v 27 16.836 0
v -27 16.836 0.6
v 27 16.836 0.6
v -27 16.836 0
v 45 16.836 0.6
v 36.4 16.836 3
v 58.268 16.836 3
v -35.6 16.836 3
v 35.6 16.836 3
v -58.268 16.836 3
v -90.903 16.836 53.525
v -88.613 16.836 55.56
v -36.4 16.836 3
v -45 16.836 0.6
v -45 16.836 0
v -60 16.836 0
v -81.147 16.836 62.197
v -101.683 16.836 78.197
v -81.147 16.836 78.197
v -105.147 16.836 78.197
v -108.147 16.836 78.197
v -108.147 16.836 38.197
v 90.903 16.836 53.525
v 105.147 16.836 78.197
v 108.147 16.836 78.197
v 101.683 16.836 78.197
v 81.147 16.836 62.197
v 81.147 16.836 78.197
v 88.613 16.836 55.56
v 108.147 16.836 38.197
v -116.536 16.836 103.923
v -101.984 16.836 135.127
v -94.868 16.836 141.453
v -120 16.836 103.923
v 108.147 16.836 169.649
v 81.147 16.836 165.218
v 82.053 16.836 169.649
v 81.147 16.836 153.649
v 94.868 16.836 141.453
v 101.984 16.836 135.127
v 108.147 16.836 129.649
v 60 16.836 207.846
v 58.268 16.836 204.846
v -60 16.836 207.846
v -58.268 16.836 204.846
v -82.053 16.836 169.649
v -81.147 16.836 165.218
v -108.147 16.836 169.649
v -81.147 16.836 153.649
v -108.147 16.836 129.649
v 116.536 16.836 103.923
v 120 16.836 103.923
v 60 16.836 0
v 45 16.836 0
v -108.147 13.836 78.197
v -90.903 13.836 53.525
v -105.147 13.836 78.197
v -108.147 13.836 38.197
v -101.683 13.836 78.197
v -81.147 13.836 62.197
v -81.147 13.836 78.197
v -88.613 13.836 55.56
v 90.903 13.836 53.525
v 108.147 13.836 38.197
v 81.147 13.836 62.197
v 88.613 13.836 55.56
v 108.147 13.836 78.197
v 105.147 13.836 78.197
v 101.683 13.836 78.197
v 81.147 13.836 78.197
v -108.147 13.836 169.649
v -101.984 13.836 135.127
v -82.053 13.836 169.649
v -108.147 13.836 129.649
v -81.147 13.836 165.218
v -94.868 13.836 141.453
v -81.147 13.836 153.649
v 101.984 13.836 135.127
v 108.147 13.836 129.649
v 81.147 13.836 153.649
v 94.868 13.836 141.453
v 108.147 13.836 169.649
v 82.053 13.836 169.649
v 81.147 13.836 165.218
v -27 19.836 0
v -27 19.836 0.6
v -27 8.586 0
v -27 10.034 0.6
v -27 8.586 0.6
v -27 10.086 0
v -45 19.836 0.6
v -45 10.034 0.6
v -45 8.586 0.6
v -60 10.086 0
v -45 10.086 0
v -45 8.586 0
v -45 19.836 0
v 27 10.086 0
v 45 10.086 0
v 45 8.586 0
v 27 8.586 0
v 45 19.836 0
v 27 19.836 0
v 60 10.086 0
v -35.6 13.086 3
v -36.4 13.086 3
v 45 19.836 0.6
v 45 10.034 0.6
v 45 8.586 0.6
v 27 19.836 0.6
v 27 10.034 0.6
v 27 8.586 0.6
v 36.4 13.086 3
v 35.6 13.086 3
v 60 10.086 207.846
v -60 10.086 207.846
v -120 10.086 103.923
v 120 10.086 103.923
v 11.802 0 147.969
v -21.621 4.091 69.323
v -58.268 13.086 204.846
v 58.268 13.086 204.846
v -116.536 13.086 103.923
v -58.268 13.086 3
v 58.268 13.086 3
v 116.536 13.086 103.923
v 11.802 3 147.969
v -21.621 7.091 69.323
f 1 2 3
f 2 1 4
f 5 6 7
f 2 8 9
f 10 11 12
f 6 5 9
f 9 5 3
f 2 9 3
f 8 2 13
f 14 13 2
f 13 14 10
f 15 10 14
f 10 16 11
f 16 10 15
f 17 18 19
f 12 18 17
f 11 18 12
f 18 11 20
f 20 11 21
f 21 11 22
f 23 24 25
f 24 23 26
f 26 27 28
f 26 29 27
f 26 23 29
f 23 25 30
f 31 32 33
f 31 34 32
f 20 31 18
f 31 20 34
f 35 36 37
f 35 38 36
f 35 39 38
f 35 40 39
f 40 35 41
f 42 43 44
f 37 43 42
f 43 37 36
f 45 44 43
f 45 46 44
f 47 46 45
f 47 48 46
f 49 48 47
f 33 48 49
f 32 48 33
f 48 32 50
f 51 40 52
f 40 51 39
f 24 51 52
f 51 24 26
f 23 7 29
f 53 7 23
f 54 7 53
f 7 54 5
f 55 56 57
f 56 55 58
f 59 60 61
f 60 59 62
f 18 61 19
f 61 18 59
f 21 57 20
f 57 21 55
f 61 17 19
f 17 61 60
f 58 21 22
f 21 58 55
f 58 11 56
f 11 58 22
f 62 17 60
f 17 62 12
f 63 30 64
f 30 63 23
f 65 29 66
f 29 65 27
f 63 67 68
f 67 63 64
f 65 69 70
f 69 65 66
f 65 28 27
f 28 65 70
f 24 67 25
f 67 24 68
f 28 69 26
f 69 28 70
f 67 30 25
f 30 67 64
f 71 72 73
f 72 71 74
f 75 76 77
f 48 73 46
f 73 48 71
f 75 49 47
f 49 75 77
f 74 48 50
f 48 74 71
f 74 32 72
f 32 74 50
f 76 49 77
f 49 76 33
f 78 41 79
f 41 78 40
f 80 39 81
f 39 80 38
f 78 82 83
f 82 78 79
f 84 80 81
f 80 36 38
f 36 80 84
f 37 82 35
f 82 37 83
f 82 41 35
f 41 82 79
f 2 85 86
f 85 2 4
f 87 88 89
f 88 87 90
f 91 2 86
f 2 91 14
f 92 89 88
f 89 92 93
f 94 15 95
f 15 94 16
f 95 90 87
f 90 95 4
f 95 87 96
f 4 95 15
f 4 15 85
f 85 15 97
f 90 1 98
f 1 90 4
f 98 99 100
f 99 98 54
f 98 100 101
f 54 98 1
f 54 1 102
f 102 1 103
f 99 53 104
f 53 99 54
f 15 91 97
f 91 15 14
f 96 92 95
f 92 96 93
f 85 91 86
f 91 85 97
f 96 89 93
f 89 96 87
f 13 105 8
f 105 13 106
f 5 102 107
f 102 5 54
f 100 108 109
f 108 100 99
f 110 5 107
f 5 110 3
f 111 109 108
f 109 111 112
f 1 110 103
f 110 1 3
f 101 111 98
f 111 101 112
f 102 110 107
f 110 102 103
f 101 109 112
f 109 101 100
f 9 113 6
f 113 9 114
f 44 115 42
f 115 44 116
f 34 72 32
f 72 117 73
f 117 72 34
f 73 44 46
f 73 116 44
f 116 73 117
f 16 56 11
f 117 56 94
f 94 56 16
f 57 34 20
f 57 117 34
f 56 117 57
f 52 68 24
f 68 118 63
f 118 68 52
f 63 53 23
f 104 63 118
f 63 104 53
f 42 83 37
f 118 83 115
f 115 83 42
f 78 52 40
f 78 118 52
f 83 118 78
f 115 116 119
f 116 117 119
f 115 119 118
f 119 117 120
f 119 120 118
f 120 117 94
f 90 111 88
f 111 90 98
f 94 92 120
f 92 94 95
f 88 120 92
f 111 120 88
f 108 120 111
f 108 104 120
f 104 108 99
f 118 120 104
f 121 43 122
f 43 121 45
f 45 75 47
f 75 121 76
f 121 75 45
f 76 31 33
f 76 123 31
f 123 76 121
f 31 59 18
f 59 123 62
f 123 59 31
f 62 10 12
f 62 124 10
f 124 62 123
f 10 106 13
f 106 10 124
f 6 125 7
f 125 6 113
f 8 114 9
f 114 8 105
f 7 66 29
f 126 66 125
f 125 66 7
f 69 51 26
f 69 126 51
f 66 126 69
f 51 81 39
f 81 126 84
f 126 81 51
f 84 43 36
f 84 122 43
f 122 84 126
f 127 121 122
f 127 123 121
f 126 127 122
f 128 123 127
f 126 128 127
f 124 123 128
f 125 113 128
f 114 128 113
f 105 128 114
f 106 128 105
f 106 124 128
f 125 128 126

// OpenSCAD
/*
    parametric_faceted_hex_wall_tile_mount_v32_native_vertical_mounts_fixed_anchor.scad
    ----------------------------------------------------------------
    Regular asymmetric low-poly hex wall tile.

    v32 goals
    ---------
    1. Multi-object plate packing is the default design target.
    2. Preserve a TRUE regular hexagon -- no X/Y stretching.
    3. Default maximum corner-to-corner width = 240 mm / 9.449 in.
    4. Vertical export rests on a complete flat hex side, not a point.
    5. Open back remains fully open.
    6. Hidden mounting pads remain clipped below the visible face.
    7. One master thickness controls shell, perimeter, and pads.
    8. Integrated low-profile sacrificial stabilizer feet are enabled by default.
    9. Vertical export uses mounting pads generated directly in final print
       coordinates instead of rotating/clipping the legacy rear tabs.
    10. v32 fixes the side-wall anchor so every pad penetrates the sloped
        perimeter wall over its ENTIRE vertical span.
    11. Each pad begins with a 45-degree lower ramp from that wall connection,
        preventing isolated first layers.
    12. No tall fins, diagonal scaffolds, horizontal shelves, or slicer-generated
        support are intended.
    13. The rear mounting surface remains flat for double-stick tape.

    Recommended default
    -------------------
    face_size_reference      = "across_corners";
    face_size_units          = "mm";
    face_size                = 240.0;   // 9.449" maximum width

    tile_rotation_deg        = 15;

    export_orientation       = "vertical";
    vertical_edge_angle_deg  = 15;      // flat side on build plate

    master_thickness_mm      = 3.0;
    add_mount_pads           = true;
    add_mount_ribs           = false;

    // Multi-copy stability:
    add_vertical_breakaway_feet = true;
    vertical_foot_depth_mm       = 5.0;
    vertical_foot_height_mm      = 0.60;
    vertical_foot_neck_mm        = 0.80;

    Export
    ------
    F6 Render
    File -> Export -> Export as STL
*/


// =============================================================================
// CUSTOMIZER PARAMETERS
// =============================================================================


/* [Finished Face Size] */

// "bounding_square"
//     face_size is the maximum X and Y envelope.
//
// "flat_to_flat"
//     face_size is the traditional hex flat-to-flat dimension.
//
// "across_corners"
//     face_size is the regular-hex corner-to-corner dimension.
//
// v32 DEFAULT:
// across_corners = 240 mm so the vertically printed tile is about:
//     X = 240.0 mm
//     Z = 207.85 mm
// while resting on a complete flat edge.
face_size_reference = "across_corners"; // [bounding_square, flat_to_flat, across_corners]

// Units used by face_size.
face_size_units = "mm";                   // [mm, in]

// Default = 240 mm / 9.449 in maximum corner-to-corner width.
// This leaves useful X-axis margin on a 256 mm plate.
face_size = 240.0;

// Rotation of the finished hex within its face plane.
//
// IMPORTANT:
// 15 degrees gives a regular hex an equal X/Y bounding envelope.
// With bounding_square + 254 mm this produces approximately:
//     X = 254.0 mm
//     Y = 254.0 mm
tile_rotation_deg = 15;


/* [Export / Print Orientation] */

// "flat"     = conventional CAD orientation; decorative face points +Z.
// "vertical" = rotate final part onto an edge for vertical printing.
export_orientation = "vertical";          // [flat, vertical]

// Additional in-plane rotation used ONLY before standing the part vertically.
//
// IMPORTANT:
// The finished face uses tile_rotation_deg = 15 so its X/Y envelope is exactly
// square. A regular hex rests on a FLAT SIDE when its effective print-plane
// rotation is 30 degrees (modulo 60 degrees).
//
// Therefore the default vertical export adds another 15 degrees:
//
//     15 deg finished-face rotation
//   + 15 deg vertical export rotation
//   = 30 deg effective print rotation
//
// This puts a complete flat hex side on the build plate instead of a point.
// The transformed model is automatically translated so that side rests at Z=0.
// Rotate the finished 15-degree face orientation another 15 degrees before
// standing it up. 15 + 15 = 30 degrees, which places a complete hex side
// horizontally at the bottom rather than balancing the tile on a vertex.
vertical_edge_angle_deg = 15;

// Add small breakaway stabilizer feet after the model is stood vertically.
// Normally leave OFF and use a slicer brim if required.
add_vertical_breakaway_feet = true;

// Breakaway-foot dimensions.
vertical_foot_length_mm = 18.0;
vertical_foot_depth_mm = 5.0;
vertical_foot_height_mm = 0.60;
vertical_foot_neck_mm = 0.80;


/* [MASTER THICKNESS] */

// Main material thickness control.
master_thickness_mm = 3.0;

// Optional tuning multipliers.
front_shell_multiplier = 1.0;
perimeter_multiplier   = 1.0;
mount_pad_multiplier   = 1.0;


/* [Front Relief] */

// "proportional" scales relief with the true flat-to-flat dimension.
// "absolute" uses explicit millimeter values.
relief_height_mode = "proportional";      // [proportional, absolute]

relief_scale = 1.0;

// Relative relief proportions.
peak_height_ratio = 0.081;
ridge_to_peak_ratio = 0.757;
edge_to_peak_ratio = 0.097;

// Used only in absolute mode.
peak_height_mm   = 18.5;
ridge_height_mm = 14.0;
edge_height_mm  = 1.8;

// Minimum air gap between inner roof and mounting geometry.
edge_clearance_mm = 0.60;


/* [Facet Layout] */

peak_angle_deg = 45;
peak_radius_ratio = 0.38;

ridge_angle_deg = 208;
ridge_radius_ratio = 0.34;


/* [Wall Mounting] */

add_mount_pads = true;

// Width parallel to local hex edge.
mount_pad_width_mm = 34.0;

// Radial depth into the cavity.
mount_pad_depth_mm = 24.0;

// Structural overlap beneath the inner perimeter shell.
mount_pad_overlap_mm = 4.0;

// Pull mounting geometry inward from the visible outside perimeter.
 // Keep this smaller than the perimeter-wall thickness so the pad still
 // overlaps the wall by a positive amount.
// IMPORTANT:
 // Must be LESS than perimeter_wall_thickness_mm so the pads physically
 // overlap the perimeter wall and become one connected solid.
 mount_pad_edge_inset_mm = 0.5;

// Clearance below underside of visible face.
mount_face_clearance_mm = 0.75;

// Mount-pad directions in the tile's local coordinate system.
mount_pad_angles = [60, 120, 240, 300];


/* [Mount Reinforcement] */

add_mount_ribs = false;

mount_rib_width_mm  = 3.0;
mount_rib_height_mm = 5.0;
mount_rib_depth_mm  = 8.0;


/* [Optional Screw Holes] */

add_pad_screw_holes = false;

pad_screw_hole_diameter_mm = 4.5;



/* [Plate Packing Guidance] */

// These values do NOT duplicate objects inside the STL.
// They provide planning numbers in the OpenSCAD console for arranging
// multiple copies in the slicer.
//
// Typical X2D-style plate planning:
//   usable Y = 256 mm
//   keep a conservative front/rear margin
plate_depth_mm = 256.0;

plate_front_margin_mm = 8.0;
plate_rear_margin_mm  = 8.0;

// Recommended empty gap between adjacent standing tiles.
// Increase if using aggressive acceleration or if the printer has noticeable
// resonance/wobble on tall parts.
recommended_inter_tile_gap_mm = 8.0;

// Feet extend from Y=0 to vertical_foot_depth_mm.
// The actual tile relief occupies approximately peak_height in Y.
// Packing pitch uses whichever is deeper, plus the inter-tile gap.


/* [Native Vertical Mount Pads] */

// v31 default.
//
// In vertical export mode, do NOT use the legacy radial mounting-pad solids.
// Instead create four tape pads directly on the rear face in final print
// coordinates. This makes their layer behavior explicit and predictable.
use_native_vertical_mount_pads = true;

// Number/locations are defined as fractions of total vertical print height.
// Two pads on the left and two on the right.
vertical_mount_z_ratios = [0.28, 0.72];

// Height of each rear tape pad in final print Z.
vertical_mount_height_mm = 40.0;

// How far each pad extends inward from the perimeter wall in final print X.
vertical_mount_depth_mm = 24.0;

// Positive overlap into the perimeter wall so the tab is one fused solid.
vertical_mount_wall_overlap_mm = 3.0;

// 45-degree lower ramp length.
// Keep equal to depth for a true 45-degree supportless lower boundary.
vertical_mount_ramp_mm = 24.0;

// Rear-pad thickness in Y. By default use the master mount-pad thickness.
vertical_mount_thickness_mm = master_thickness_mm * mount_pad_multiplier;

// Small inset from top/bottom extremes for safety.
vertical_mount_min_edge_clearance_mm = 8.0;


/* [Vertical Self-Supporting Mount Pads] */

// Recommended ON for vertical printing.
//
// Each rectangular mounting-pad footprint is clipped by a 45-degree
// print-space half-space. The lower boundary starts at the pad's wall-connected
// outer corner and rises toward the unsupported portion of the pad.
//
// This avoids BOTH:
//   1. floating-island starts
//   2. flat horizontal pad undersides that cause slicer support warnings.
make_mount_pads_vertical_self_supporting = true;

// Small amount below the wall-connected start height that is retained.
// 0.20 mm is approximately one standard layer and guarantees overlap.
mount_pad_print_safety_mm = 0.20;

// Lower-face chamfer angle in FINAL PRINT coordinates.
//
// 45 degrees is the conservative default for supportless PLA printing.
// Larger values make a steeper/more vertical underside.
// Keep between 40 and 55 degrees unless deliberately experimenting.
mount_pad_support_angle_deg = 45.0;

// Large half-space size used only for clipping.
print_halfspace_size_mm = 1000.0;


/* [Vertical Anti-Float Gussets] */

// Some mounting pads begin above the build plate when the tile is printed
// vertically. Instead of a tall free-standing fin, v28 generates a short,
// diagonal sacrificial gusset from the already-printed perimeter wall toward
// the lowest corner of each affected pad.
//
// The gusset:
// - stays inside the rear cavity
// - is thin in Y for easy removal
// - grows from the shell toward the pad
// - is generated only for pads that would otherwise start as an island
add_vertical_antifloat_gussets = false;

// Thin sacrificial thickness into the cavity.
antifloat_gusset_thickness_mm = 0.70;

// How far the gusset extends into the pad for reliable layer connection.
antifloat_gusset_pad_overlap_mm = 1.50;

// Vertical distance below the first pad layer used for the shell-side anchor.
// A 30 mm drop keeps the diagonal print angle conservative while remaining
// dramatically shorter than the previous full-height support fins.
antifloat_gusset_drop_mm = 30.0;

// Height of the short attachment edge against the perimeter wall.
antifloat_gusset_wall_base_mm = 5.0;

// Keep the wall anchor slightly inside the visible outer perimeter.
antifloat_gusset_wall_inset_mm = 1.5;

// Ignore a pad if its lowest point is already essentially on the build plate.
antifloat_min_height_mm = 0.80;


/* [Advanced] */

polyhedron_convexity = 12;
screw_hole_fn = 40;

// Small numerical tolerance.
eps = 0.01;


// =============================================================================
// HELPERS
// =============================================================================

function polar(angle_deg, radius) =
    [
        radius * cos(angle_deg),
        radius * sin(angle_deg)
    ];

function hex_vertex_unrotated(i, radius) =
    [
        radius * cos(30 + i * 60),
        radius * sin(30 + i * 60)
    ];

function rotate2d(p, angle_deg) =
    [
        p[0] * cos(angle_deg) - p[1] * sin(angle_deg),
        p[0] * sin(angle_deg) + p[1] * cos(angle_deg)
    ];


// Position of a raw mount-pad corner after all in-plane rotations used by the
// vertical export. Returned as [final_X, final_Z] because after rotate X=90,
// original in-plane Y becomes print Z.
function mount_print_corner(angle_deg, radial_r, lateral_t) =
    let(
        theta =
            angle_deg
            + tile_rotation_deg
            + vertical_edge_angle_deg
    )
    [
        radial_r * cos(theta) - lateral_t * sin(theta),
        vertical_half_y
            + radial_r * sin(theta)
            + lateral_t * cos(theta)
    ];

function mount_print_corners(angle_deg) =
    [
        mount_print_corner(
            angle_deg,
            mount_pad_inner_r,
            -mount_pad_width_mm / 2
        ),
        mount_print_corner(
            angle_deg,
            mount_pad_inner_r,
             mount_pad_width_mm / 2
        ),
        mount_print_corner(
            angle_deg,
            mount_pad_desired_outer_r,
            -mount_pad_width_mm / 2
        ),
        mount_print_corner(
            angle_deg,
            mount_pad_desired_outer_r,
             mount_pad_width_mm / 2
        )
    ];

function mount_corner_z_values(angle_deg) =
    [
        for (p = mount_print_corners(angle_deg))
            p[1]
    ];

function mount_lowest_z(angle_deg) =
    min(mount_corner_z_values(angle_deg));

function mount_lowest_corner_index(angle_deg) =
    search(
        mount_lowest_z(angle_deg),
        mount_corner_z_values(angle_deg)
    )[0];

function mount_lowest_x(angle_deg) =
    mount_print_corners(angle_deg)[
        mount_lowest_corner_index(angle_deg)
    ][0];


function mount_outer_print_z_values(angle_deg) =
    [
        mount_print_corner(
            angle_deg,
            mount_pad_desired_outer_r,
            -mount_pad_width_mm / 2
        )[1],

        mount_print_corner(
            angle_deg,
            mount_pad_desired_outer_r,
             mount_pad_width_mm / 2
        )[1]
    ];

function mount_outer_lowest_z(angle_deg) =
    min(mount_outer_print_z_values(angle_deg));

function mount_outer_print_corners(angle_deg) =
    [
        mount_print_corner(
            angle_deg,
            mount_pad_desired_outer_r,
            -mount_pad_width_mm / 2
        ),

        mount_print_corner(
            angle_deg,
            mount_pad_desired_outer_r,
             mount_pad_width_mm / 2
        )
    ];

function mount_outer_lowest_corner_index(angle_deg) =
    search(
        mount_outer_lowest_z(angle_deg),
        mount_outer_print_z_values(angle_deg)
    )[0];

function mount_outer_lowest_x(angle_deg) =
    mount_outer_print_corners(angle_deg)[
        mount_outer_lowest_corner_index(angle_deg)
    ][0];

function mount_outer_lowest_lateral(angle_deg) =
    mount_outer_lowest_corner_index(angle_deg) == 0
        ? -mount_pad_width_mm / 2
        :  mount_pad_width_mm / 2;

function mount_matching_inner_x(angle_deg) =
    mount_print_corner(
        angle_deg,
        mount_pad_inner_r,
        mount_outer_lowest_lateral(angle_deg)
    )[0];

function mount_inward_x_sign(angle_deg) =
    mount_matching_inner_x(angle_deg) >= mount_outer_lowest_x(angle_deg)
        ? 1
        : -1;



// Half-width of the stood-up regular hex at a given print Z.
//
// In the default flat-side-down vertical orientation:
// - bottom/top edges are flat
// - maximum width is across corners
// - total print height is flat-to-flat
//
// This lets the sacrificial gusset anchor itself directly into the perimeter
// wall at the same side of the tile as the affected mounting pad.
function vertical_hex_half_width_at_z(z_mm) =
    let(
        zc = min(max(z_mm, 0), vertical_print_height),
        dz = min(zc, vertical_print_height - zc)
    )
    hex_side_length / 2 + dz / tan(60);

function hex_vertex(i, radius) =
    rotate2d(
        hex_vertex_unrotated(i, radius),
        tile_rotation_deg
    );

// Half-width / half-height of a unit-circumradius rotated regular hex.
function unit_hex_half_x(rotation_deg) =
    max([
        for (i = [0 : 5])
            abs(
                cos(30 + i * 60 + rotation_deg)
            )
    ]);

function unit_hex_half_y(rotation_deg) =
    max([
        for (i = [0 : 5])
            abs(
                sin(30 + i * 60 + rotation_deg)
            )
    ]);

// Bounding box of a regular hex with circumradius r.
function hex_bbox_x(r, rotation_deg) =
    2 * r * unit_hex_half_x(rotation_deg);

function hex_bbox_y(r, rotation_deg) =
    2 * r * unit_hex_half_y(rotation_deg);


// =============================================================================
// DERIVED MATERIAL THICKNESSES
// =============================================================================

front_shell_thickness_mm =
    master_thickness_mm * front_shell_multiplier;

perimeter_wall_thickness_mm =
    master_thickness_mm * perimeter_multiplier;

mount_pad_thickness_mm =
    master_thickness_mm * mount_pad_multiplier;


// =============================================================================
// DERIVED FACE DIMENSIONS
// =============================================================================

_face_size_mm =
    face_size_units == "in"
        ? face_size * 25.4
        : face_size;

// If bounding_square is selected, choose the largest regular-hex radius that
// fits inside both the requested X and Y dimensions.
//
// At tile_rotation_deg = 15, unit X and Y extents are equal, so both dimensions
// become exactly face_size.
r_outer =
    face_size_reference == "flat_to_flat"
        ? (_face_size_mm / 2) / cos(30)
        : face_size_reference == "across_corners"
            ? _face_size_mm / 2
            : min(
                _face_size_mm / (2 * unit_hex_half_x(tile_rotation_deg)),
                _face_size_mm / (2 * unit_hex_half_y(tile_rotation_deg))
              );

tile_flat_to_flat =
    2 * r_outer * cos(30);

tile_across_corners =
    2 * r_outer;

finished_bbox_x =
    hex_bbox_x(r_outer, tile_rotation_deg);

finished_bbox_y =
    hex_bbox_y(r_outer, tile_rotation_deg);

outer_apothem =
    tile_flat_to_flat / 2;

inner_apothem =
    outer_apothem - perimeter_wall_thickness_mm;

r_inner =
    inner_apothem / cos(30);

inner_flat_length =
    2 * inner_apothem * tan(30);

hex_side_length =
    r_outer;


// =============================================================================
// DERIVED RELIEF HEIGHTS
// =============================================================================

_peak_unscaled =
    relief_height_mode == "proportional"
        ? tile_flat_to_flat * peak_height_ratio
        : peak_height_mm;

_ridge_unscaled =
    relief_height_mode == "proportional"
        ? _peak_unscaled * ridge_to_peak_ratio
        : ridge_height_mm;

_requested_edge_unscaled =
    relief_height_mode == "proportional"
        ? _peak_unscaled * edge_to_peak_ratio
        : edge_height_mm;

peak_height =
    _peak_unscaled * relief_scale;

ridge_height =
    _ridge_unscaled * relief_scale;

requested_edge_height =
    _requested_edge_unscaled * relief_scale;

// Enough vertical room for front shell + complete pad + clearance.
minimum_edge_height =
    front_shell_thickness_mm
    + mount_pad_thickness_mm
    + mount_face_clearance_mm;

edge_height =
    max(
        requested_edge_height,
        minimum_edge_height
    );


// =============================================================================
// DERIVED MOUNTING GEOMETRY
// =============================================================================

mount_pad_desired_outer_r =
    inner_apothem + mount_pad_overlap_mm;

mount_pad_inner_r =
    mount_pad_desired_outer_r - mount_pad_depth_mm;

mount_pad_center_r =
    mount_pad_desired_outer_r - mount_pad_depth_mm / 2;

mount_clip_apothem =
    outer_apothem - mount_pad_edge_inset_mm;

mount_clip_radius =
    mount_clip_apothem / cos(30);


// =============================================================================
// VERTICAL-EXPORT DERIVED VALUES
// =============================================================================
//
// The tile is first rotated around Z by vertical_edge_angle_deg, then stood up
// by +90 degrees around X.
//
// We calculate the local Y envelope AFTER that optional Z rotation so the
// final model can be translated to put its lowest point exactly on Z=0.

vertical_rotation_total_deg =
    vertical_edge_angle_deg;

vertical_half_y =
    max([
        for (i = [0 : 5])
            abs(
                r_outer
                * sin(
                    30
                    + i * 60
                    + tile_rotation_deg
                    + vertical_rotation_total_deg
                )
            )
    ]);

vertical_print_height =
    2 * vertical_half_y;

// After rotate([90,0,0]), original +Z becomes -Y.
// Translate by peak_height so all relief lies in positive Y.
vertical_print_depth =
    peak_height;

// Multi-copy packing envelope in Y.
//
// vertical_tile() occupies approximately peak_height of Y-depth.
// Breakaway feet occupy vertical_foot_depth_mm.
// Use the larger dimension as the per-part physical depth.
vertical_object_depth =
    add_vertical_breakaway_feet
        ? vertical_print_depth + 3.0
        : vertical_print_depth;

recommended_copy_pitch_y =
    vertical_object_depth + recommended_inter_tile_gap_mm;

usable_plate_depth =
    plate_depth_mm
    - plate_front_margin_mm
    - plate_rear_margin_mm;

estimated_copies_per_plate_depth =
    max(
        1,
        floor(
            (
                usable_plate_depth
                + recommended_inter_tile_gap_mm
            )
            / recommended_copy_pitch_y
        )
    );


// =============================================================================
// VALIDATION
// =============================================================================

assert(
    _face_size_mm > 0,
    "face_size must produce a positive dimension."
);

assert(
    master_thickness_mm > 0,
    "master_thickness_mm must be greater than zero."
);

assert(
    front_shell_multiplier > 0
    && perimeter_multiplier > 0
    && mount_pad_multiplier > 0,
    "All thickness multipliers must be greater than zero."
);

assert(
    front_shell_thickness_mm > 0,
    "front_shell_thickness_mm must be greater than zero."
);

assert(
    perimeter_wall_thickness_mm > 0,
    "perimeter_wall_thickness_mm must be greater than zero."
);

assert(
    perimeter_wall_thickness_mm < outer_apothem,
    "perimeter_wall_thickness_mm is too large for this tile."
);

assert(
    inner_apothem > 0,
    "The selected perimeter wall leaves no hollow interior."
);

assert(
    edge_height > front_shell_thickness_mm,
    "Internal error: edge_height must exceed front_shell_thickness_mm."
);

assert(
    ridge_height > edge_height,
    "ridge_height must remain greater than the effective edge height."
);

assert(
    peak_height > ridge_height,
    "peak_height must remain greater than ridge_height."
);

assert(
    peak_radius_ratio > 0 && peak_radius_ratio < 0.90,
    "peak_radius_ratio must be between 0 and 0.90."
);

assert(
    ridge_radius_ratio > 0 && ridge_radius_ratio < 0.90,
    "ridge_radius_ratio must be between 0 and 0.90."
);

assert(
    mount_pad_width_mm > 0,
    "mount_pad_width_mm must be greater than zero."
);

assert(
    mount_pad_depth_mm > 0,
    "mount_pad_depth_mm must be greater than zero."
);

assert(
    mount_pad_thickness_mm > 0,
    "mount_pad_thickness_mm must be greater than zero."
);

assert(
    mount_pad_overlap_mm >= 0,
    "mount_pad_overlap_mm cannot be negative."
);

assert(
    mount_pad_edge_inset_mm >= 0,
    "mount_pad_edge_inset_mm cannot be negative."
);

assert(
    mount_pad_edge_inset_mm < perimeter_wall_thickness_mm,
    "mount_pad_edge_inset_mm must be smaller than perimeter_wall_thickness_mm so mounting pads overlap and join the perimeter wall."
);

assert(
    mount_face_clearance_mm >= 0,
    "mount_face_clearance_mm cannot be negative."
);

assert(
    mount_clip_apothem > 0,
    "mount_pad_edge_inset_mm is too large."
);

assert(
    mount_pad_inner_r > 0,
    "mount_pad_depth_mm is too large and reaches/passes the tile center."
);

assert(
    !add_pad_screw_holes
    || pad_screw_hole_diameter_mm < mount_pad_width_mm * 0.75,
    "pad_screw_hole_diameter_mm is too large for the mounting pad."
);

assert(
    !add_mount_ribs
    || mount_rib_height_mm > 0,
    "mount_rib_height_mm must be greater than zero."
);

assert(
    !add_vertical_breakaway_feet
    || export_orientation == "vertical",
    "Vertical breakaway feet require export_orientation = \"vertical\"."
);

assert(
    plate_depth_mm > 0,
    "plate_depth_mm must be greater than zero."
);

assert(
    plate_front_margin_mm >= 0
    && plate_rear_margin_mm >= 0,
    "Plate margins cannot be negative."
);

assert(
    recommended_inter_tile_gap_mm >= 0,
    "recommended_inter_tile_gap_mm cannot be negative."
);

assert(
    usable_plate_depth > 0,
    "Plate margins leave no usable plate depth."
);


assert(
    antifloat_gusset_thickness_mm > 0
    && antifloat_gusset_thickness_mm <= mount_pad_thickness_mm,
    "antifloat_gusset_thickness_mm must be > 0 and no thicker than the mounting pad."
);

assert(
    antifloat_gusset_pad_overlap_mm > 0,
    "antifloat_gusset_pad_overlap_mm must be greater than zero."
);

assert(
    antifloat_gusset_drop_mm > 0,
    "antifloat_gusset_drop_mm must be greater than zero."
);

assert(
    antifloat_gusset_wall_base_mm > 0,
    "antifloat_gusset_wall_base_mm must be greater than zero."
);

assert(
    antifloat_gusset_wall_inset_mm >= 0,
    "antifloat_gusset_wall_inset_mm cannot be negative."
);


assert(
    mount_pad_print_safety_mm >= 0,
    "mount_pad_print_safety_mm cannot be negative."
);

assert(
    mount_pad_support_angle_deg >= 40
    && mount_pad_support_angle_deg <= 55,
    "mount_pad_support_angle_deg should remain between 40 and 55 degrees."
);

assert(
    print_halfspace_size_mm > tile_across_corners * 2,
    "print_halfspace_size_mm is too small for the tile."
);


assert(
    vertical_mount_height_mm > vertical_mount_ramp_mm,
    "vertical_mount_height_mm must be greater than vertical_mount_ramp_mm."
);

assert(
    vertical_mount_depth_mm > 0,
    "vertical_mount_depth_mm must be greater than zero."
);

assert(
    vertical_mount_wall_overlap_mm > 0,
    "vertical_mount_wall_overlap_mm must be greater than zero."
);

assert(
    vertical_mount_thickness_mm > 0,
    "vertical_mount_thickness_mm must be greater than zero."
);


// =============================================================================
// DIAGNOSTIC OUTPUT
// =============================================================================

echo("====================================================");
echo("FACETED HEX WALL TILE v32 - NATIVE VERTICAL MOUNTS / FIXED WALL ANCHOR");
echo("====================================================");

echo(str("face size reference      : ", face_size_reference));
echo(str("requested face size      : ", _face_size_mm, " mm"));
echo(str("tile rotation            : ", tile_rotation_deg, " deg"));

echo(str("finished bbox X          : ", finished_bbox_x, " mm"));
echo(str("finished bbox Y          : ", finished_bbox_y, " mm"));
echo(str("finished bbox X inches   : ", finished_bbox_x / 25.4, " in"));
echo(str("finished bbox Y inches   : ", finished_bbox_y / 25.4, " in"));

echo(str("flat-to-flat             : ", tile_flat_to_flat, " mm"));
echo(str("across-corners           : ", tile_across_corners, " mm"));
echo(str("hex side length          : ", hex_side_length, " mm"));

echo(str("MASTER thickness         : ", master_thickness_mm, " mm"));
echo(str("actual front shell       : ", front_shell_thickness_mm, " mm"));
echo(str("actual perimeter wall    : ", perimeter_wall_thickness_mm, " mm"));
echo(str("actual mount pad         : ", mount_pad_thickness_mm, " mm"));

echo(str("requested edge height    : ", requested_edge_height, " mm"));
echo(str("minimum edge height      : ", minimum_edge_height, " mm"));
echo(str("EFFECTIVE edge height    : ", edge_height, " mm"));

echo(str("ridge height             : ", ridge_height, " mm"));
echo(str("peak height              : ", peak_height, " mm"));
echo(str("peak height inches       : ", peak_height / 25.4, " in"));

echo(str("mount pad width          : ", mount_pad_width_mm, " mm"));
echo(str("mount pad depth          : ", mount_pad_depth_mm, " mm"));
echo(str("mount pad thickness      : ", mount_pad_thickness_mm, " mm"));
echo(str("mount pad overlap        : ", mount_pad_overlap_mm, " mm"));
echo(str("mount support angle      : ", mount_pad_support_angle_deg, " deg"));
echo(str("native vertical mounts   : ", use_native_vertical_mount_pads));
echo(str("vertical mount height    : ", vertical_mount_height_mm, " mm"));
echo(str("vertical mount depth     : ", vertical_mount_depth_mm, " mm"));
echo(str("vertical mount ramp      : ", vertical_mount_ramp_mm, " mm"));
echo(str("vertical wall overlap    : ", vertical_mount_wall_overlap_mm, " mm"));
echo(str("mount edge inset         : ", mount_pad_edge_inset_mm, " mm"));
echo(str("mount/face clearance     : ", mount_face_clearance_mm, " mm"));

echo(str("export orientation       : ", export_orientation));

if (
    export_orientation == "vertical"
    && add_mount_pads
    && add_vertical_antifloat_gussets
) {
    for (a = mount_pad_angles)
        echo(
            str(
                "mount pad ",
                a,
                " deg lowest print Z : ",
                mount_lowest_z(a),
                " mm"
            )
        );

        echo(
            str(
                "mount pad ",
                a,
                " deg wall-start Z   : ",
                mount_outer_lowest_z(a),
                " mm"
            )
        );
}

echo(str("vertical extra rotation  : ", vertical_edge_angle_deg, " deg"));
echo(str("effective print rotation : ",
         tile_rotation_deg + vertical_edge_angle_deg, " deg"));

if (export_orientation == "vertical"
    && abs(
        ((tile_rotation_deg + vertical_edge_angle_deg) % 60) - 30
    ) < 0.001)
    echo("build-plate contact      : FLAT HEX SIDE");
else if (export_orientation == "vertical")
    echo("build-plate contact      : WARNING - NOT EXACTLY FLAT-SIDE DOWN");

if (export_orientation == "vertical") {
    echo(str("vertical print height    : ", vertical_print_height, " mm"));
    echo(str("vertical relief depth    : ", vertical_print_depth, " mm"));
    echo(str("vertical object depth    : ", vertical_object_depth, " mm"));
    echo(str("recommended Y gap        : ", recommended_inter_tile_gap_mm, " mm"));
    echo(str("recommended Y pitch      : ", recommended_copy_pitch_y, " mm"));
    echo(str("usable plate Y depth     : ", usable_plate_depth, " mm"));
    echo(str("estimated copies in Y    : ", estimated_copies_per_plate_depth));
}

if (edge_height > requested_edge_height)
    echo(
        str(
            "AUTO EDGE FIX ACTIVE: edge raised from ",
            requested_edge_height,
            " mm to ",
            edge_height,
            " mm."
        )
    );

echo("====================================================");


// =============================================================================
// FRONT RELIEF CONTROL POINTS
// =============================================================================

P_xy =
    polar(
        peak_angle_deg + tile_rotation_deg,
        r_outer * peak_radius_ratio
    );

Q_xy =
    polar(
        ridge_angle_deg + tile_rotation_deg,
        r_outer * ridge_radius_ratio
    );


// =============================================================================
// SHELL VERTICES
// =============================================================================

points =
    concat(

        // 0..5 : outer rear perimeter
        [
            for (i = [0 : 5])
                let(p = hex_vertex(i, r_outer))
                [p[0], p[1], 0]
        ],

        // 6..11 : outer front perimeter
        [
            for (i = [0 : 5])
                let(p = hex_vertex(i, r_outer))
                [p[0], p[1], edge_height]
        ],

        // 12..13 : outer peak / ridge
        [
            [P_xy[0], P_xy[1], peak_height],
            [Q_xy[0], Q_xy[1], ridge_height]
        ],

        // 14..19 : inner rear perimeter
        [
            for (i = [0 : 5])
                let(p = hex_vertex(i, r_inner))
                [p[0], p[1], 0]
        ],

        // 20..25 : inner front perimeter
        [
            for (i = [0 : 5])
                let(p = hex_vertex(i, r_inner))
                [p[0], p[1], edge_height - front_shell_thickness_mm]
        ],

        // 26..27 : inner peak / ridge
        [
            [
                P_xy[0],
                P_xy[1],
                peak_height - front_shell_thickness_mm
            ],
            [
                Q_xy[0],
                Q_xy[1],
                ridge_height - front_shell_thickness_mm
            ]
        ]
    );


// =============================================================================
// SHELL FACES
// =============================================================================

outer_roof_faces = [
    [6, 7, 12],
    [7, 8, 12],
    [6, 12, 11],

    [8, 13, 12],
    [11, 12, 13],

    [8, 9, 13],
    [9, 10, 13],
    [10, 11, 13]
];

inner_roof_faces = [
    [26, 21, 20],
    [26, 22, 21],
    [25, 26, 20],

    [26, 27, 22],
    [27, 26, 25],

    [27, 23, 22],
    [27, 24, 23],
    [27, 25, 24]
];

faces =
    concat(

        // Outer vertical perimeter
        [
            for (i = [0 : 5])
                [
                    i,
                    (i + 1) % 6,
                    6 + (i + 1) % 6,
                    6 + i
                ]
        ],

        outer_roof_faces,

        // Inner vertical perimeter
        [
            for (i = [0 : 5])
                [
                    14 + i,
                    20 + i,
                    20 + (i + 1) % 6,
                    14 + (i + 1) % 6
                ]
        ],

        inner_roof_faces,

        // Narrow rear perimeter ring only.
        // Center remains fully open.
        [
            for (i = [0 : 5])
                [
                    i,
                    14 + i,
                    14 + (i + 1) % 6,
                    (i + 1) % 6
                ]
        ]
    );


// =============================================================================
// TILE SHELL
// =============================================================================

module tile_shell() {
    polyhedron(
        points = points,
        faces = faces,
        convexity = polyhedron_convexity
    );
}


// =============================================================================
// SAFE MOUNTING VOLUME BELOW FRONT FACE
// =============================================================================

safe_edge_z =
    max(
        eps,
        edge_height
        - front_shell_thickness_mm
        - mount_face_clearance_mm
    );

safe_peak_z =
    max(
        eps,
        peak_height
        - front_shell_thickness_mm
        - mount_face_clearance_mm
    );

safe_ridge_z =
    max(
        eps,
        ridge_height
        - front_shell_thickness_mm
        - mount_face_clearance_mm
    );

safe_mount_points =
    concat(

        // 0..5 : rear outer perimeter
        [
            for (i = [0 : 5])
                let(p = hex_vertex(i, r_outer))
                [p[0], p[1], 0]
        ],

        // 6..11 : safe ceiling at outer perimeter
        [
            for (i = [0 : 5])
                let(p = hex_vertex(i, r_outer))
                [p[0], p[1], safe_edge_z]
        ],

        // 12..13 : safe ceiling under peak/ridge
        [
            [P_xy[0], P_xy[1], safe_peak_z],
            [Q_xy[0], Q_xy[1], safe_ridge_z]
        ]
    );

safe_mount_ceiling_faces = [
    [6, 7, 12],
    [7, 8, 12],
    [6, 12, 11],
    [8, 13, 12],
    [11, 12, 13],
    [8, 9, 13],
    [9, 10, 13],
    [10, 11, 13]
];

safe_mount_faces =
    concat(

        // Outer side walls.
        [
            for (i = [0 : 5])
                [
                    i,
                    (i + 1) % 6,
                    6 + (i + 1) % 6,
                    6 + i
                ]
        ],

        // Sloped safe ceiling.
        safe_mount_ceiling_faces,

        // Rear floor used only to close clipping volume.
        [[5, 4, 3, 2, 1, 0]]
    );

module safe_mount_volume() {
    polyhedron(
        points = safe_mount_points,
        faces = safe_mount_faces,
        convexity = polyhedron_convexity
    );
}


// =============================================================================
// HEX FOOTPRINT FOR MOUNT CLIPPING
// =============================================================================

module mount_clip_volume(height_mm) {
    linear_extrude(height = height_mm)
        polygon(
            points = [
                for (i = [0 : 5])
                    hex_vertex(i, mount_clip_radius)
            ]
        );
}


// =============================================================================
// 45-DEGREE PRINT-SPACE HALF-SPACE FOR SELF-SUPPORTING MOUNT PADS
// =============================================================================
//
// v29 used a horizontal print-Z cutoff. That solved floating islands but
// created a flat underside, which Bambu Studio correctly identified as an
// overhang needing support.
//
// v30 instead keeps geometry ABOVE a sloped plane:
//
//     Z >= anchor_Z + slope * (X - anchor_X)
//
// where slope corresponds to mount_pad_support_angle_deg.
//
// The plane is defined in FINAL PRINT coordinates, then inverse-transformed
// back into the tile's native coordinate system for intersection with each pad.

module final_print_sloped_halfspace(
    anchor_x,
    anchor_z,
    inward_x_sign
) {

    H = print_halfspace_size_mm;

    slope =
        inward_x_sign
        * tan(mount_pad_support_angle_deg);

    z_left =
        anchor_z
        + slope * (-H - anchor_x);

    z_right =
        anchor_z
        + slope * ( H - anchor_x);

    top_z = H * 2;

    polyhedron(
        points = [
            [-H, -H, z_left],
            [ H, -H, z_right],
            [ H,  H, z_right],
            [-H,  H, z_left],

            [-H, -H, top_z],
            [ H, -H, top_z],
            [ H,  H, top_z],
            [-H,  H, top_z]
        ],

        faces = [
            [0, 3, 2, 1],
            [4, 5, 6, 7],

            [0, 1, 5, 4],
            [1, 2, 6, 5],
            [2, 3, 7, 6],
            [3, 0, 4, 7]
        ],

        convexity = 8
    );
}


module supportless_mount_clip(angle_deg) {

    anchor_x =
        mount_outer_lowest_x(angle_deg);

    anchor_z =
        mount_outer_lowest_z(angle_deg)
        - mount_pad_print_safety_mm;

    inward_sign =
        mount_inward_x_sign(angle_deg);

    // Inverse of the vertical-export transform:
    //
    // forward =
    //   translate([0, peak_height, vertical_half_y])
    //   rotate([90,0,0])
    //   rotate([0,0,vertical_edge_angle_deg])
    //
    // inverse =
    //   rotate Z(-phi)
    //   rotate X(-90)
    //   translate(-T)

    rotate([0, 0, -vertical_edge_angle_deg])

        rotate([-90, 0, 0])

            translate(
                [
                    0,
                    -peak_height,
                    -vertical_half_y
                ]
            )

                final_print_sloped_halfspace(
                    anchor_x,
                    anchor_z,
                    inward_sign
                );
}


// =============================================================================
// RAW MOUNT PAD
// =============================================================================
//
// Mount-pad angles are local tile angles. tile_rotation_deg is applied so the
// pads remain attached to the same visual positions when the face rotates.

module raw_mount_pad(angle_deg) {
    rotate([0, 0, angle_deg + tile_rotation_deg])
        translate(
            [
                mount_pad_inner_r,
                -mount_pad_width_mm / 2,
                0
            ]
        )
            cube(
                [
                    mount_pad_depth_mm,
                    mount_pad_width_mm,
                    mount_pad_thickness_mm
                ]
            );
}


// =============================================================================
// CLIPPED MOUNT PAD
// =============================================================================

module mount_pad(angle_deg) {

    intersection() {

        raw_mount_pad(angle_deg);

        // Keep pad inside inset hex footprint while still penetrating the
        // perimeter wall enough to form a robust union.
        mount_clip_volume(
            mount_pad_thickness_mm + eps
        );

        // Hard stop below underside of front shell.
        safe_mount_volume();

        // Vertical-print island + overhang prevention.
        //
        // The sloped clip starts at the wall-connected lower corner and rises
        // inward at mount_pad_support_angle_deg. This prevents both an isolated
        // pad start and a horizontal underside that would require support.
        if (
            export_orientation == "vertical"
            && make_mount_pads_vertical_self_supporting
        )
            supportless_mount_clip(angle_deg);
    }
}


// =============================================================================
// OPTIONAL REINFORCING RIBS
// =============================================================================

module raw_mount_ribs(angle_deg) {

    rib_center_r =
        mount_pad_desired_outer_r
        - mount_rib_depth_mm / 2;

    rib_side_offset =
        max(
            0,
            mount_pad_width_mm / 2
            - mount_rib_width_mm
            - 2
        );

    rotate([0, 0, angle_deg + tile_rotation_deg]) {

        for (side = [-1, 1]) {

            translate(
                [
                    rib_center_r - mount_rib_depth_mm / 2,
                    side * rib_side_offset - mount_rib_width_mm / 2,
                    mount_pad_thickness_mm
                ]
            )

            rotate([90, 0, 90])

            linear_extrude(height = mount_rib_depth_mm)

            polygon(
                points = [
                    [0, 0],
                    [mount_rib_width_mm, 0],
                    [mount_rib_width_mm, mount_rib_height_mm],
                    [0, 0]
                ]
            );
        }
    }
}

module mount_ribs(angle_deg) {
    intersection() {

        raw_mount_ribs(angle_deg);

        mount_clip_volume(
            mount_pad_thickness_mm
            + mount_rib_height_mm
            + 0.1
        );

        safe_mount_volume();
    }
}


// =============================================================================
// OPTIONAL SCREW HOLE
// =============================================================================

module pad_screw_hole(angle_deg) {

    rotate([0, 0, angle_deg + tile_rotation_deg])

        translate(
            [
                mount_pad_center_r,
                0,
                -1
            ]
        )

            cylinder(
                d = pad_screw_hole_diameter_mm,
                h =
                    mount_pad_thickness_mm
                    + mount_rib_height_mm
                    + 2,
                $fn = screw_hole_fn
            );
}


// =============================================================================
// COMPLETE FINISHED TILE
// =============================================================================

module finished_tile(include_legacy_mounts = true) {

    difference() {

        union() {

            tile_shell();

            if (
                include_legacy_mounts
                && add_mount_pads
            ) {

                for (a = mount_pad_angles) {

                    mount_pad(a);

                    if (add_mount_ribs)
                        mount_ribs(a);
                }
            }
        }

        if (
            include_legacy_mounts
            && add_mount_pads
            && add_pad_screw_holes
        ) {

            for (a = mount_pad_angles)
                pad_screw_hole(a);
        }
    }
}


// =============================================================================
// VERTICAL-PRINT TRANSFORM
// =============================================================================
//
// Transform order in OpenSCAD is inside-out:
//
// 1. finished_tile()
// 2. optional extra Z rotation for selecting another edge
// 3. rotate +90 degrees around X so the face stands vertically
// 4. translate so:
//      - relief depth occupies positive Y
//      - lowest tile point is exactly at Z=0

module vertical_tile() {

    translate(
        [
            0,
            peak_height,
            vertical_half_y
        ]
    )

    rotate([90, 0, 0])

    rotate([0, 0, vertical_edge_angle_deg])

        finished_tile(
            !(
                use_native_vertical_mount_pads
                && add_mount_pads
            )
        );
}


// =============================================================================
// NATIVE VERTICAL-PRINT REAR MOUNTING PADS
// =============================================================================
//
// These solids are created AFTER the tile has been rotated into its final
// vertical print orientation.
//
// Coordinate system here:
//   X = horizontal across plate
//   Y = tile depth / relief direction
//   Z = print height
//
// Rear wall-facing plane:
//   Y = peak_height
//
// Pad cavity-side plane:
//   Y = peak_height - vertical_mount_thickness_mm
//
// Each pad is attached to one sloped perimeter side. Its lower edge ramps
// inward at 45 degrees, so successive layers grow from the perimeter wall
// rather than appearing as an isolated island.
//
// v32 anchor rule:
// use the OUTERMOST perimeter X over the complete pad height, then extend the
// pad another vertical_mount_wall_overlap_mm into the shell. This avoids the
// partial-contact condition that v31 could create.

module native_vertical_mount_pad(side_sign, center_z) {

    pad_h =
        vertical_mount_height_mm;

    pad_d =
        vertical_mount_depth_mm;

    ramp =
        min(
            vertical_mount_ramp_mm,
            pad_h - 1.0
        );

    z0 =
        max(
            vertical_mount_min_edge_clearance_mm,
            center_z - pad_h / 2
        );

    z1 =
        min(
            vertical_print_height
            - vertical_mount_min_edge_clearance_mm,
            z0 + pad_h
        );

    actual_h =
        z1 - z0;

    actual_ramp =
        min(
            ramp,
            actual_h - 0.5
        );

    // Evaluate the outer shell boundary at the lower end of the pad.
    // A small wall overlap ensures a true volumetric union.
    wall_x0 =
        side_sign
        * vertical_hex_half_width_at_z(z0);

    wall_x1 =
        side_sign
        * vertical_hex_half_width_at_z(z1);

    // Use the more inward of the two wall positions so the full vertical
    // attachment edge penetrates the perimeter wall over the pad height.
    // IMPORTANT v32 FIX:
    // Choose the MORE OUTWARD side-wall position across the full pad height.
    // This guarantees the pad overlaps the sloped perimeter at every Z in its
    // span rather than only at one end.
    wall_x =
        side_sign > 0
            ? max(wall_x0, wall_x1)
            : min(wall_x0, wall_x1);

    outer_x =
        wall_x
        + side_sign * vertical_mount_wall_overlap_mm;

    inner_x =
        wall_x
        - side_sign * pad_d;

    // Footprint in X/Z.
    //
    // RIGHT side:
    //   outer lower -> outer upper -> inner upper -> inner ramp point
    //
    // LEFT side is mirrored automatically by side_sign.
    pad_xz = [
        [outer_x, z0],
        [outer_x, z1],
        [inner_x, z1],
        [inner_x, z0 + actual_ramp]
    ];

    y0 =
        peak_height - vertical_mount_thickness_mm;

    linear_extrude(
        height = vertical_mount_thickness_mm,
        convexity = 8
    )
        // linear_extrude operates along +Z, so construct the X/Y polygon
        // and rotate it into final X/Z, with extrusion becoming final Y.
        // This local transform keeps the wall-facing surface exactly flat.
        children();
}


// Build a prism from an X/Z polygon, extruded through Y.
module xz_polygon_prism(points_xz, y_start, y_depth) {

    translate([0, y_start + y_depth, 0])

        rotate([90, 0, 0])

            linear_extrude(
                height = y_depth,
                convexity = 8
            )

                polygon(
                    points = points_xz
                );
}


module native_vertical_mount_pad_prism(side_sign, center_z) {

    pad_h =
        vertical_mount_height_mm;

    pad_d =
        vertical_mount_depth_mm;

    ramp =
        min(
            vertical_mount_ramp_mm,
            pad_h - 1.0
        );

    z0 =
        max(
            vertical_mount_min_edge_clearance_mm,
            center_z - pad_h / 2
        );

    z1 =
        min(
            vertical_print_height
            - vertical_mount_min_edge_clearance_mm,
            z0 + pad_h
        );

    actual_h =
        z1 - z0;

    actual_ramp =
        min(
            ramp,
            actual_h - 0.5
        );

    wall_x0 =
        side_sign
        * vertical_hex_half_width_at_z(z0);

    wall_x1 =
        side_sign
        * vertical_hex_half_width_at_z(z1);

    // IMPORTANT v32 FIX:
    // Choose the MORE OUTWARD side-wall position across the full pad height.
    // This guarantees the pad overlaps the sloped perimeter at every Z in its
    // span rather than only at one end.
    wall_x =
        side_sign > 0
            ? max(wall_x0, wall_x1)
            : min(wall_x0, wall_x1);

    outer_x =
        wall_x
        + side_sign * vertical_mount_wall_overlap_mm;

    inner_x =
        wall_x
        - side_sign * pad_d;

    pts =
        side_sign > 0
            ? [
                [outer_x, z0],
                [outer_x, z1],
                [inner_x, z1],
                [inner_x, z0 + actual_ramp]
              ]
            : [
                [outer_x, z0],
                [inner_x, z0 + actual_ramp],
                [inner_x, z1],
                [outer_x, z1]
              ];

    xz_polygon_prism(
        pts,
        peak_height - vertical_mount_thickness_mm,
        vertical_mount_thickness_mm
    );
}


module native_vertical_mount_pads() {

    if (
        export_orientation == "vertical"
        && add_mount_pads
        && use_native_vertical_mount_pads
    ) {

        for (zr = vertical_mount_z_ratios) {

            center_z =
                vertical_print_height * zr;

            native_vertical_mount_pad_prism(
                -1,
                center_z
            );

            native_vertical_mount_pad_prism(
                1,
                center_z
            );
        }
    }
}


// =============================================================================
// OPTIONAL BREAKAWAY VERTICAL FEET
// =============================================================================
//
// These are intentionally simple sacrificial tabs.
// They are added only in vertical export mode.
// Leave OFF unless a brim alone is not sufficient.

module vertical_breakaway_feet() {

    /*
        CONNECTED stabilizer feet.

        For flat-side-down vertical export, the bottom perimeter wall occupies
        approximately:

            Y = peak_height - edge_height  ...  peak_height

        and the bottom flat side spans roughly one hex-side length in X.

        The v25 feet were placed near Y=0 and too far outward in X, so they
        could become disconnected solids. v26 deliberately overlaps the
        actual bottom perimeter wall in both X and Y.

        The tabs extend only a few millimeters beyond the rear face, keeping
        Y-depth compact for multi-copy plate packing.
    */

    foot_center_x =
        hex_side_length * 0.30;

    // Safely inside the actual bottom flat-edge span.
    foot_length_x =
        min(
            vertical_foot_length_mm,
            hex_side_length * 0.25
        );

    // Bottom perimeter wall depth after the vertical transform.
    bottom_wall_y_min =
        peak_height - edge_height;

    bottom_wall_y_max =
        peak_height;

    // Extend a little toward the decorative face and a little behind the tile.
    foot_y_min =
        max(
            0,
            bottom_wall_y_min - 1.5
        );

    foot_y_max =
        bottom_wall_y_max + 3.0;

    attached_foot_depth =
        foot_y_max - foot_y_min;

    for (x = [-foot_center_x, foot_center_x]) {

        // Main shallow sacrificial pad.
        //
        // It overlaps the lower perimeter wall in volume, so CGAL produces
        // one connected body instead of merely touching at a plane.
        translate(
            [
                x - foot_length_x / 2,
                foot_y_min,
                0
            ]
        )
            cube(
                [
                    foot_length_x,
                    attached_foot_depth,
                    vertical_foot_height_mm
                ]
            );

        // Small reinforcing neck rising into the bottom perimeter wall.
        translate(
            [
                x - vertical_foot_neck_mm / 2,
                bottom_wall_y_min,
                0
            ]
        )
            cube(
                [
                    vertical_foot_neck_mm,
                    edge_height,
                    min(3.0, perimeter_wall_thickness_mm)
                ]
            );
    }
}



// =============================================================================
// AUTOMATIC VERTICAL ANTI-FLOAT GUSSETS
// =============================================================================
//
// These are sacrificial PRINTING AIDS.
//
// Each elevated mounting pad gets a thin triangular prism whose:
//   - upper tip overlaps the lowest pad corner
//   - lower/base edge overlaps the already-existing perimeter wall
//   - thickness lies only on the cavity side
//
// Because the support grows diagonally out of the shell, it avoids the long,
// free-standing vertical strips used in v27.
//
// The triangle is constructed directly in final print X/Z coordinates, then
// extruded a small amount in Y.

module xz_triangle_prism(p0, p1, p2, y0, thickness_y) {

    y1 = y0 + thickness_y;

    polyhedron(
        points = [
            [p0[0], y0, p0[1]],
            [p1[0], y0, p1[1]],
            [p2[0], y0, p2[1]],

            [p0[0], y1, p0[1]],
            [p1[0], y1, p1[1]],
            [p2[0], y1, p2[1]]
        ],

        faces = [
            [0, 2, 1],
            [3, 4, 5],

            [0, 1, 4, 3],
            [1, 2, 5, 4],
            [2, 0, 3, 5]
        ],

        convexity = 8
    );
}


module vertical_antifloat_gusset(angle_deg) {

    lowest_z = mount_lowest_z(angle_deg);
    lowest_x = mount_lowest_x(angle_deg);

    if (lowest_z > antifloat_min_height_mm) {

        // Choose a shell anchor below the first pad layer.
        anchor_z =
            max(
                0.40,
                lowest_z - antifloat_gusset_drop_mm
            );

        // Which side of the tile is the pad on?
        side_sign =
            lowest_x < 0 ? -1 : 1;

        // Anchor into the actual perimeter wall rather than floating in space.
        anchor_half_width =
            vertical_hex_half_width_at_z(anchor_z);

        anchor_x =
            side_sign
            * max(
                0,
                anchor_half_width
                - antifloat_gusset_wall_inset_mm
            );

        // Short vertical attachment edge against the perimeter wall.
        wall_base_z0 =
            max(
                0.20,
                anchor_z - antifloat_gusset_wall_base_mm / 2
            );

        wall_base_z1 =
            min(
                vertical_print_height - 0.20,
                anchor_z + antifloat_gusset_wall_base_mm / 2
            );

        // Move the gusset tip slightly into the pad, ensuring a true overlap
        // rather than a zero-thickness/tangent contact.
        tip_x =
            lowest_x
            - side_sign * antifloat_gusset_pad_overlap_mm;

        tip_z =
            lowest_z
            + antifloat_gusset_pad_overlap_mm;

        // Cavity-side Y position.
        //
        // The rear mounting pads occupy approximately:
        //   Y = peak_height - mount_pad_thickness_mm ... peak_height
        //
        // Put the gusset against the cavity-facing side of that pad.
        gusset_y =
            peak_height
            - mount_pad_thickness_mm;

        xz_triangle_prism(
            [anchor_x, wall_base_z0],
            [anchor_x, wall_base_z1],
            [tip_x, tip_z],
            gusset_y,
            antifloat_gusset_thickness_mm
        );
    }
}


module vertical_antifloat_gussets() {

    if (
        export_orientation == "vertical"
        && add_mount_pads
        && add_vertical_antifloat_gussets
    ) {
        for (a = mount_pad_angles)
            vertical_antifloat_gusset(a);
    }
}


// =============================================================================
// OUTPUT
// =============================================================================
//
// Default v32 exported STL target:
//   X ~ 240.00 mm  / 9.449 in
//   Y ~ relief depth (~17-19 mm depending on relief settings)
//   Z ~ 207.85 mm  / 8.183 in
//
// Multiple copies should be duplicated and arrayed along Y in the slicer.

module output_model() {

    if (export_orientation == "vertical") {

        union() {

            vertical_tile();

            native_vertical_mount_pads();

            if (add_vertical_breakaway_feet)
                vertical_breakaway_feet();
        }

    } else {

        finished_tile();
    }
}

output_model();
